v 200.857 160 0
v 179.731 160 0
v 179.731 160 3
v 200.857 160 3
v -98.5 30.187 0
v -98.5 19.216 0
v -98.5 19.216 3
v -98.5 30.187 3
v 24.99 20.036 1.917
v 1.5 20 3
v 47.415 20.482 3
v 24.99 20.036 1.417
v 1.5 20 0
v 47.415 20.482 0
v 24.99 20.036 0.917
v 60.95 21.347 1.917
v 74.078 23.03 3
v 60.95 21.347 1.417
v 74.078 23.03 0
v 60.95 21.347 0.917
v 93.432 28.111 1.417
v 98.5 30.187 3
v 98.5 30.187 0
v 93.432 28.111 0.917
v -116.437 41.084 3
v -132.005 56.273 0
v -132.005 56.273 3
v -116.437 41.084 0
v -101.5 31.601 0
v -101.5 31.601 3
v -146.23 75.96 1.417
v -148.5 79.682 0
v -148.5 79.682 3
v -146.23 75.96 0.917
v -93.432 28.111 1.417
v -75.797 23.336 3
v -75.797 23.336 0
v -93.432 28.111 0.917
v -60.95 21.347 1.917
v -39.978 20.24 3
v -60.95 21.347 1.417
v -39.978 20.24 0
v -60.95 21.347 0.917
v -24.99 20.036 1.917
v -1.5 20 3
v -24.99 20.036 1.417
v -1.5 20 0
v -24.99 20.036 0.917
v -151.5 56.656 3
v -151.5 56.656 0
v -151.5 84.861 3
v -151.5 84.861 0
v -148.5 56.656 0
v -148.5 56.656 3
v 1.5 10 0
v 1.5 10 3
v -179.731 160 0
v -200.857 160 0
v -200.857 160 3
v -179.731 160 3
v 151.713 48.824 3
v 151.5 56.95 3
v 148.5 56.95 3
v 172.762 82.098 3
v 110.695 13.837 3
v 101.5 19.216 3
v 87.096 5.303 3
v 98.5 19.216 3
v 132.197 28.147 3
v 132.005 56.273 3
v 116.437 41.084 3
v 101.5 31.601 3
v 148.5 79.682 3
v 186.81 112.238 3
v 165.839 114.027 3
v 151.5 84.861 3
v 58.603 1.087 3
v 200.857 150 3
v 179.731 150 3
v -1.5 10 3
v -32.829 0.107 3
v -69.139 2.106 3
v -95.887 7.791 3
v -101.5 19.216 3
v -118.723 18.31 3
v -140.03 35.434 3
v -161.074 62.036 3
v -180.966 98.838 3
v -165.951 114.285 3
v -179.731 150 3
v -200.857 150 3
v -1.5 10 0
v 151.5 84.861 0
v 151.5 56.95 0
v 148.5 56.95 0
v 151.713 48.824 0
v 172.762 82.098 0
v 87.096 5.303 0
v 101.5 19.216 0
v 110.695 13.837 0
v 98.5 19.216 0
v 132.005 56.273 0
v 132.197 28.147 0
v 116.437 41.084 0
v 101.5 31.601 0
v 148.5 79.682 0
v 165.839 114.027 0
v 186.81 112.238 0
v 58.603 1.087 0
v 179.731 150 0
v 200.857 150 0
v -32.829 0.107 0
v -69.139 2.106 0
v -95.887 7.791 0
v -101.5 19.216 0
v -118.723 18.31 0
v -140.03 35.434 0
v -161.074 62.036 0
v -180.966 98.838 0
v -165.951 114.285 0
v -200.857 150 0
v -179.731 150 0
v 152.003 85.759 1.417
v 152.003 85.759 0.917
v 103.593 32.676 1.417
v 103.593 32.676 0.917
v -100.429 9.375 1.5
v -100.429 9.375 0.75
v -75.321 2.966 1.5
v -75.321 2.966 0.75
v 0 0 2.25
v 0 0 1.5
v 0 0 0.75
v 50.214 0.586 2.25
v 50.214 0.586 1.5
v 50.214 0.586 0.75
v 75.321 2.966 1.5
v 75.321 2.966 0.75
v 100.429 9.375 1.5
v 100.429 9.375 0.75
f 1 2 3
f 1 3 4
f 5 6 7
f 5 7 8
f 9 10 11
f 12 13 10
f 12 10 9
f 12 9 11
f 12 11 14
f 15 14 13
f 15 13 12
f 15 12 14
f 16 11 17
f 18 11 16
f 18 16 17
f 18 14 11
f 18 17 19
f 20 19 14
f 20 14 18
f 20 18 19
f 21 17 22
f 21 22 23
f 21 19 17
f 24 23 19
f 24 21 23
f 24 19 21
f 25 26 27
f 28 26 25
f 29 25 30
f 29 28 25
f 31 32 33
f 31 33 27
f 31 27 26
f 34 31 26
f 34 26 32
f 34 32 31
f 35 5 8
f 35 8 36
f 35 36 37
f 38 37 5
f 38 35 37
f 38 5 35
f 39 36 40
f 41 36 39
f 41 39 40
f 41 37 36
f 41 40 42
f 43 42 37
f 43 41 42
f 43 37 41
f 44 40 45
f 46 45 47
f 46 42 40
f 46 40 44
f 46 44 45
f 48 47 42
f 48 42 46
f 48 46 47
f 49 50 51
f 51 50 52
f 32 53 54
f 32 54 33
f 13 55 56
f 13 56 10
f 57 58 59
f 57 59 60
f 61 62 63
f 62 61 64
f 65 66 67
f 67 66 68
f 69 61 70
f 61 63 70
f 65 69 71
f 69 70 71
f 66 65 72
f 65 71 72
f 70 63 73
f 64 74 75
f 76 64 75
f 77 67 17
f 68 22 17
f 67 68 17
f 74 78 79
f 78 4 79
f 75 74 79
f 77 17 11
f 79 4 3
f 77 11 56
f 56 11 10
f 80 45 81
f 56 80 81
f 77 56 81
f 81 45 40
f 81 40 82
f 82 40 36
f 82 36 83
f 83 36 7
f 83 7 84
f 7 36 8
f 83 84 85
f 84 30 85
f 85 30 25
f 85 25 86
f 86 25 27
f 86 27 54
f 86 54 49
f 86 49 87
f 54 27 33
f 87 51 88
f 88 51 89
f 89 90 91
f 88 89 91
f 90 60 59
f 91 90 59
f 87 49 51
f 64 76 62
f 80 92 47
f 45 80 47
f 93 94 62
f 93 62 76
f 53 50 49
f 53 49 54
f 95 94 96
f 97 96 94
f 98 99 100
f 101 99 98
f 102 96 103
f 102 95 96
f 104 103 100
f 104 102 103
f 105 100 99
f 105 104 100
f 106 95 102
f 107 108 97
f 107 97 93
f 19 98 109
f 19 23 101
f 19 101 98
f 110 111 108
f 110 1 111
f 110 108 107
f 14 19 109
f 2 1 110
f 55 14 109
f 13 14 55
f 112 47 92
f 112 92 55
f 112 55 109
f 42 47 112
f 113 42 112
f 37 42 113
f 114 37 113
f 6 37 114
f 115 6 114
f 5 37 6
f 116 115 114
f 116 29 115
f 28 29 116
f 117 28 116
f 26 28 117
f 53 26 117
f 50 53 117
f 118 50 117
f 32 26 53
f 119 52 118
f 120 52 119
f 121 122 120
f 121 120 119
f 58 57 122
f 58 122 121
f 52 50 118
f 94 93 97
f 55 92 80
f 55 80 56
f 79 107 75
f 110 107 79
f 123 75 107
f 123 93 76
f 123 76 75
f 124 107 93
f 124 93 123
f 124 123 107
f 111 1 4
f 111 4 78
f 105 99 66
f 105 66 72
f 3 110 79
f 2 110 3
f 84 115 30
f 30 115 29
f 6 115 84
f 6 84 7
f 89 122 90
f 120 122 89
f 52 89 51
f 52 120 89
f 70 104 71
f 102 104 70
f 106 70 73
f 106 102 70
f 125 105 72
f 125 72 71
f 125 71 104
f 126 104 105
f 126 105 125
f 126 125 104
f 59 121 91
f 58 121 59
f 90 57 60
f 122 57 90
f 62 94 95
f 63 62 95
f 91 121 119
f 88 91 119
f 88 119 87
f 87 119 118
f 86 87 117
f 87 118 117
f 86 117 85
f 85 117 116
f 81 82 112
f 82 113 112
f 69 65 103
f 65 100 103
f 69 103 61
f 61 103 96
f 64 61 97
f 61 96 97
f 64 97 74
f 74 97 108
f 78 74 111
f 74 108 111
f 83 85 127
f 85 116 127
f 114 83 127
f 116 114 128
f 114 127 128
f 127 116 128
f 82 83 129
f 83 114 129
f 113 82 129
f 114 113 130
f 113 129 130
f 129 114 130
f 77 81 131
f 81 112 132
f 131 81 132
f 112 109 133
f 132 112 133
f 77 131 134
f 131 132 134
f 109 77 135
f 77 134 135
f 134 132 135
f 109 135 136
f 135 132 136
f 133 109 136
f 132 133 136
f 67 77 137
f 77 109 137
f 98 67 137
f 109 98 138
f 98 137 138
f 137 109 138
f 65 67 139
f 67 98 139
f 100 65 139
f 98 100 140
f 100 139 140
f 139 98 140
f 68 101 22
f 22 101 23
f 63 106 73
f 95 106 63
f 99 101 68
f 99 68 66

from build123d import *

# Parameters (mm, degrees)
BOSS_EXTRUDE1_DEPTH = 3
SKETCH2_W           = 2.999999902
SKETCH2_H           = 11.368148841
CUT_EXTRUDE2_DEPTH  = 22
SKETCH4_W           = 3
SKETCH4_H           = 12.91245629
CUT_EXTRUDE3_DEPTH  = 45
SKETCH5_W           = 3
SKETCH5_H           = 17.735525731
CUT_EXTRUDE4_DEPTH  = 38
SKETCH6_W           = 3
SKETCH6_H           = 30.838195809
CUT_EXTRUDE5_DEPTH  = 99
CUT_EXTRUDE6_DEPTH  = 239


with BuildPart() as part:
    # Sketch1 → Boss-Extrude1 (new body)
    with BuildSketch(Plane.XY):
        with BuildLine():
            Line((-200.857104714, 149.999999933), (-200.857104714, 159.999999933))
            Line((-200.857104714, 159.999999933), (-179.730541017, 159.999999933))
            Line((-179.730541017, 159.999999933), (-179.730541017, 149.999999952))
            add(Edge.make_bspline(
                [(-179.730541017, 149.999999952), (-179.435736312, 149.148237058), (-178.129369157, 145.400432959), (-175.809971558, 138.948879894), (-172.785816957, 130.935113712), (-168.767754052, 120.798312408), (-163.776796791, 109.130589637), (-157.847435598, 96.632896439), (-151.989239929, 85.54140938), (-144.288735397, 72.497307518), (-134.900677695, 59.219307644), (-124.086780396, 47.326283664), (-113.706041623, 38.64424455), (-103.59432148, 32.380752321), (-93.477134718, 27.890378411), (-83.091397363, 24.726267775), (-68.685014669, 21.878302713), (-49.516353479, 20.30417739), (-25.106590611, 19.975287666), (-1.8e-08, 20.012356167), (25.106590577, 19.975287666), (49.516353446, 20.304177388), (68.685014637, 21.878302709), (83.091397333, 24.726267767), (93.477134689, 27.8903784), (103.594321452, 32.380752306), (113.706041594, 38.644244529), (124.086780366, 47.326283635), (134.900677664, 59.219307605), (144.288735365, 72.497307468), (151.989239896, 85.541409321), (157.847435565, 96.632896373), (163.776796758, 109.130589562), (168.767754018, 120.798312326), (172.785816923, 130.935113624), (175.809971524, 138.948879801), (178.129369121, 145.400432856), (179.435736274, 149.148236946), (179.730540976, 149.999999832)],
                knots=[0.041921013, 0.041921013, 0.041921013, 0.041921013, 0.044025323, 0.051263016, 0.05850071, 0.065738403, 0.080213789, 0.094689176, 0.109164563, 0.123639949, 0.152590722, 0.181541495, 0.210492269, 0.239443042, 0.268393815, 0.297344588, 0.326295361, 0.384196907, 0.442098454, 0.5, 0.557901546, 0.615803093, 0.673704639, 0.702655412, 0.731606185, 0.760556958, 0.789507731, 0.818458504, 0.847409278, 0.876360051, 0.890835437, 0.905310824, 0.91978621, 0.934261597, 0.94149929, 0.948736984, 0.955974677, 0.958078987, 0.958078987, 0.958078987, 0.958078987], degree=3))
            Line((179.730540976, 149.999999832), (179.730540976, 159.999999832))
            Line((179.730540976, 159.999999832), (200.857104679, 159.999999832))
            Line((200.857104679, 159.999999832), (200.857104679, 149.999999828))
            add(Edge.make_bspline(
                [(-200.857104714, 149.999999933), (-100.428552366, -149.999999904), (-1.8e-08, 149.999999877), (100.428552329, -149.999999851), (200.857104679, 149.999999828)],
                knots=[0.03678763, 0.03678763, 0.03678763, 0.03678763, 0.03678763, 0.96321237, 0.96321237, 0.96321237, 0.96321237, 0.96321237], degree=4))
        make_face()
    extrude(amount=BOSS_EXTRUDE1_DEPTH)

    # Sketch2 → Cut-Extrude2 (cut)
    with BuildSketch(Plane.XY):
        with Locations((-4.4e-08, 15.684087839)):
            Rectangle(SKETCH2_W, SKETCH2_H)
    extrude(amount=CUT_EXTRUDE2_DEPTH, mode=Mode.SUBTRACT)

    # Sketch4 → Cut-Extrude3 (cut)
    with BuildSketch(Plane.XY):
        with Locations((99.999999956, 25.672228128)):
            Rectangle(SKETCH4_W, SKETCH4_H)
    extrude(amount=CUT_EXTRUDE3_DEPTH, mode=Mode.SUBTRACT)

    # Sketch5 → Cut-Extrude4 (cut)
    with BuildSketch(Plane.XY):
        with Locations((-100, 28.083762866)):
            Rectangle(SKETCH5_W, SKETCH5_H)
    extrude(amount=CUT_EXTRUDE4_DEPTH, mode=Mode.SUBTRACT)

    # Sketch6 → Cut-Extrude5 (cut)
    with BuildSketch(Plane.XY):
        with Locations((-150, 72.075097905)):
            Rectangle(SKETCH6_W, SKETCH6_H)
    extrude(amount=CUT_EXTRUDE5_DEPTH, mode=Mode.SUBTRACT)

    # Sketch7 → Cut-Extrude6 (cut)
    with BuildSketch(Plane.XY):
        Polygon((148.499999956, 59.949736331), (148.499999956, 86.674548715), (151.499999956, 86.674548715), (151.499999956, 59.949736331), (151.499999956, 56.949736331), (148.499999956, 56.949736331), align=None)
    extrude(amount=CUT_EXTRUDE6_DEPTH, mode=Mode.SUBTRACT)


solid = part.part
